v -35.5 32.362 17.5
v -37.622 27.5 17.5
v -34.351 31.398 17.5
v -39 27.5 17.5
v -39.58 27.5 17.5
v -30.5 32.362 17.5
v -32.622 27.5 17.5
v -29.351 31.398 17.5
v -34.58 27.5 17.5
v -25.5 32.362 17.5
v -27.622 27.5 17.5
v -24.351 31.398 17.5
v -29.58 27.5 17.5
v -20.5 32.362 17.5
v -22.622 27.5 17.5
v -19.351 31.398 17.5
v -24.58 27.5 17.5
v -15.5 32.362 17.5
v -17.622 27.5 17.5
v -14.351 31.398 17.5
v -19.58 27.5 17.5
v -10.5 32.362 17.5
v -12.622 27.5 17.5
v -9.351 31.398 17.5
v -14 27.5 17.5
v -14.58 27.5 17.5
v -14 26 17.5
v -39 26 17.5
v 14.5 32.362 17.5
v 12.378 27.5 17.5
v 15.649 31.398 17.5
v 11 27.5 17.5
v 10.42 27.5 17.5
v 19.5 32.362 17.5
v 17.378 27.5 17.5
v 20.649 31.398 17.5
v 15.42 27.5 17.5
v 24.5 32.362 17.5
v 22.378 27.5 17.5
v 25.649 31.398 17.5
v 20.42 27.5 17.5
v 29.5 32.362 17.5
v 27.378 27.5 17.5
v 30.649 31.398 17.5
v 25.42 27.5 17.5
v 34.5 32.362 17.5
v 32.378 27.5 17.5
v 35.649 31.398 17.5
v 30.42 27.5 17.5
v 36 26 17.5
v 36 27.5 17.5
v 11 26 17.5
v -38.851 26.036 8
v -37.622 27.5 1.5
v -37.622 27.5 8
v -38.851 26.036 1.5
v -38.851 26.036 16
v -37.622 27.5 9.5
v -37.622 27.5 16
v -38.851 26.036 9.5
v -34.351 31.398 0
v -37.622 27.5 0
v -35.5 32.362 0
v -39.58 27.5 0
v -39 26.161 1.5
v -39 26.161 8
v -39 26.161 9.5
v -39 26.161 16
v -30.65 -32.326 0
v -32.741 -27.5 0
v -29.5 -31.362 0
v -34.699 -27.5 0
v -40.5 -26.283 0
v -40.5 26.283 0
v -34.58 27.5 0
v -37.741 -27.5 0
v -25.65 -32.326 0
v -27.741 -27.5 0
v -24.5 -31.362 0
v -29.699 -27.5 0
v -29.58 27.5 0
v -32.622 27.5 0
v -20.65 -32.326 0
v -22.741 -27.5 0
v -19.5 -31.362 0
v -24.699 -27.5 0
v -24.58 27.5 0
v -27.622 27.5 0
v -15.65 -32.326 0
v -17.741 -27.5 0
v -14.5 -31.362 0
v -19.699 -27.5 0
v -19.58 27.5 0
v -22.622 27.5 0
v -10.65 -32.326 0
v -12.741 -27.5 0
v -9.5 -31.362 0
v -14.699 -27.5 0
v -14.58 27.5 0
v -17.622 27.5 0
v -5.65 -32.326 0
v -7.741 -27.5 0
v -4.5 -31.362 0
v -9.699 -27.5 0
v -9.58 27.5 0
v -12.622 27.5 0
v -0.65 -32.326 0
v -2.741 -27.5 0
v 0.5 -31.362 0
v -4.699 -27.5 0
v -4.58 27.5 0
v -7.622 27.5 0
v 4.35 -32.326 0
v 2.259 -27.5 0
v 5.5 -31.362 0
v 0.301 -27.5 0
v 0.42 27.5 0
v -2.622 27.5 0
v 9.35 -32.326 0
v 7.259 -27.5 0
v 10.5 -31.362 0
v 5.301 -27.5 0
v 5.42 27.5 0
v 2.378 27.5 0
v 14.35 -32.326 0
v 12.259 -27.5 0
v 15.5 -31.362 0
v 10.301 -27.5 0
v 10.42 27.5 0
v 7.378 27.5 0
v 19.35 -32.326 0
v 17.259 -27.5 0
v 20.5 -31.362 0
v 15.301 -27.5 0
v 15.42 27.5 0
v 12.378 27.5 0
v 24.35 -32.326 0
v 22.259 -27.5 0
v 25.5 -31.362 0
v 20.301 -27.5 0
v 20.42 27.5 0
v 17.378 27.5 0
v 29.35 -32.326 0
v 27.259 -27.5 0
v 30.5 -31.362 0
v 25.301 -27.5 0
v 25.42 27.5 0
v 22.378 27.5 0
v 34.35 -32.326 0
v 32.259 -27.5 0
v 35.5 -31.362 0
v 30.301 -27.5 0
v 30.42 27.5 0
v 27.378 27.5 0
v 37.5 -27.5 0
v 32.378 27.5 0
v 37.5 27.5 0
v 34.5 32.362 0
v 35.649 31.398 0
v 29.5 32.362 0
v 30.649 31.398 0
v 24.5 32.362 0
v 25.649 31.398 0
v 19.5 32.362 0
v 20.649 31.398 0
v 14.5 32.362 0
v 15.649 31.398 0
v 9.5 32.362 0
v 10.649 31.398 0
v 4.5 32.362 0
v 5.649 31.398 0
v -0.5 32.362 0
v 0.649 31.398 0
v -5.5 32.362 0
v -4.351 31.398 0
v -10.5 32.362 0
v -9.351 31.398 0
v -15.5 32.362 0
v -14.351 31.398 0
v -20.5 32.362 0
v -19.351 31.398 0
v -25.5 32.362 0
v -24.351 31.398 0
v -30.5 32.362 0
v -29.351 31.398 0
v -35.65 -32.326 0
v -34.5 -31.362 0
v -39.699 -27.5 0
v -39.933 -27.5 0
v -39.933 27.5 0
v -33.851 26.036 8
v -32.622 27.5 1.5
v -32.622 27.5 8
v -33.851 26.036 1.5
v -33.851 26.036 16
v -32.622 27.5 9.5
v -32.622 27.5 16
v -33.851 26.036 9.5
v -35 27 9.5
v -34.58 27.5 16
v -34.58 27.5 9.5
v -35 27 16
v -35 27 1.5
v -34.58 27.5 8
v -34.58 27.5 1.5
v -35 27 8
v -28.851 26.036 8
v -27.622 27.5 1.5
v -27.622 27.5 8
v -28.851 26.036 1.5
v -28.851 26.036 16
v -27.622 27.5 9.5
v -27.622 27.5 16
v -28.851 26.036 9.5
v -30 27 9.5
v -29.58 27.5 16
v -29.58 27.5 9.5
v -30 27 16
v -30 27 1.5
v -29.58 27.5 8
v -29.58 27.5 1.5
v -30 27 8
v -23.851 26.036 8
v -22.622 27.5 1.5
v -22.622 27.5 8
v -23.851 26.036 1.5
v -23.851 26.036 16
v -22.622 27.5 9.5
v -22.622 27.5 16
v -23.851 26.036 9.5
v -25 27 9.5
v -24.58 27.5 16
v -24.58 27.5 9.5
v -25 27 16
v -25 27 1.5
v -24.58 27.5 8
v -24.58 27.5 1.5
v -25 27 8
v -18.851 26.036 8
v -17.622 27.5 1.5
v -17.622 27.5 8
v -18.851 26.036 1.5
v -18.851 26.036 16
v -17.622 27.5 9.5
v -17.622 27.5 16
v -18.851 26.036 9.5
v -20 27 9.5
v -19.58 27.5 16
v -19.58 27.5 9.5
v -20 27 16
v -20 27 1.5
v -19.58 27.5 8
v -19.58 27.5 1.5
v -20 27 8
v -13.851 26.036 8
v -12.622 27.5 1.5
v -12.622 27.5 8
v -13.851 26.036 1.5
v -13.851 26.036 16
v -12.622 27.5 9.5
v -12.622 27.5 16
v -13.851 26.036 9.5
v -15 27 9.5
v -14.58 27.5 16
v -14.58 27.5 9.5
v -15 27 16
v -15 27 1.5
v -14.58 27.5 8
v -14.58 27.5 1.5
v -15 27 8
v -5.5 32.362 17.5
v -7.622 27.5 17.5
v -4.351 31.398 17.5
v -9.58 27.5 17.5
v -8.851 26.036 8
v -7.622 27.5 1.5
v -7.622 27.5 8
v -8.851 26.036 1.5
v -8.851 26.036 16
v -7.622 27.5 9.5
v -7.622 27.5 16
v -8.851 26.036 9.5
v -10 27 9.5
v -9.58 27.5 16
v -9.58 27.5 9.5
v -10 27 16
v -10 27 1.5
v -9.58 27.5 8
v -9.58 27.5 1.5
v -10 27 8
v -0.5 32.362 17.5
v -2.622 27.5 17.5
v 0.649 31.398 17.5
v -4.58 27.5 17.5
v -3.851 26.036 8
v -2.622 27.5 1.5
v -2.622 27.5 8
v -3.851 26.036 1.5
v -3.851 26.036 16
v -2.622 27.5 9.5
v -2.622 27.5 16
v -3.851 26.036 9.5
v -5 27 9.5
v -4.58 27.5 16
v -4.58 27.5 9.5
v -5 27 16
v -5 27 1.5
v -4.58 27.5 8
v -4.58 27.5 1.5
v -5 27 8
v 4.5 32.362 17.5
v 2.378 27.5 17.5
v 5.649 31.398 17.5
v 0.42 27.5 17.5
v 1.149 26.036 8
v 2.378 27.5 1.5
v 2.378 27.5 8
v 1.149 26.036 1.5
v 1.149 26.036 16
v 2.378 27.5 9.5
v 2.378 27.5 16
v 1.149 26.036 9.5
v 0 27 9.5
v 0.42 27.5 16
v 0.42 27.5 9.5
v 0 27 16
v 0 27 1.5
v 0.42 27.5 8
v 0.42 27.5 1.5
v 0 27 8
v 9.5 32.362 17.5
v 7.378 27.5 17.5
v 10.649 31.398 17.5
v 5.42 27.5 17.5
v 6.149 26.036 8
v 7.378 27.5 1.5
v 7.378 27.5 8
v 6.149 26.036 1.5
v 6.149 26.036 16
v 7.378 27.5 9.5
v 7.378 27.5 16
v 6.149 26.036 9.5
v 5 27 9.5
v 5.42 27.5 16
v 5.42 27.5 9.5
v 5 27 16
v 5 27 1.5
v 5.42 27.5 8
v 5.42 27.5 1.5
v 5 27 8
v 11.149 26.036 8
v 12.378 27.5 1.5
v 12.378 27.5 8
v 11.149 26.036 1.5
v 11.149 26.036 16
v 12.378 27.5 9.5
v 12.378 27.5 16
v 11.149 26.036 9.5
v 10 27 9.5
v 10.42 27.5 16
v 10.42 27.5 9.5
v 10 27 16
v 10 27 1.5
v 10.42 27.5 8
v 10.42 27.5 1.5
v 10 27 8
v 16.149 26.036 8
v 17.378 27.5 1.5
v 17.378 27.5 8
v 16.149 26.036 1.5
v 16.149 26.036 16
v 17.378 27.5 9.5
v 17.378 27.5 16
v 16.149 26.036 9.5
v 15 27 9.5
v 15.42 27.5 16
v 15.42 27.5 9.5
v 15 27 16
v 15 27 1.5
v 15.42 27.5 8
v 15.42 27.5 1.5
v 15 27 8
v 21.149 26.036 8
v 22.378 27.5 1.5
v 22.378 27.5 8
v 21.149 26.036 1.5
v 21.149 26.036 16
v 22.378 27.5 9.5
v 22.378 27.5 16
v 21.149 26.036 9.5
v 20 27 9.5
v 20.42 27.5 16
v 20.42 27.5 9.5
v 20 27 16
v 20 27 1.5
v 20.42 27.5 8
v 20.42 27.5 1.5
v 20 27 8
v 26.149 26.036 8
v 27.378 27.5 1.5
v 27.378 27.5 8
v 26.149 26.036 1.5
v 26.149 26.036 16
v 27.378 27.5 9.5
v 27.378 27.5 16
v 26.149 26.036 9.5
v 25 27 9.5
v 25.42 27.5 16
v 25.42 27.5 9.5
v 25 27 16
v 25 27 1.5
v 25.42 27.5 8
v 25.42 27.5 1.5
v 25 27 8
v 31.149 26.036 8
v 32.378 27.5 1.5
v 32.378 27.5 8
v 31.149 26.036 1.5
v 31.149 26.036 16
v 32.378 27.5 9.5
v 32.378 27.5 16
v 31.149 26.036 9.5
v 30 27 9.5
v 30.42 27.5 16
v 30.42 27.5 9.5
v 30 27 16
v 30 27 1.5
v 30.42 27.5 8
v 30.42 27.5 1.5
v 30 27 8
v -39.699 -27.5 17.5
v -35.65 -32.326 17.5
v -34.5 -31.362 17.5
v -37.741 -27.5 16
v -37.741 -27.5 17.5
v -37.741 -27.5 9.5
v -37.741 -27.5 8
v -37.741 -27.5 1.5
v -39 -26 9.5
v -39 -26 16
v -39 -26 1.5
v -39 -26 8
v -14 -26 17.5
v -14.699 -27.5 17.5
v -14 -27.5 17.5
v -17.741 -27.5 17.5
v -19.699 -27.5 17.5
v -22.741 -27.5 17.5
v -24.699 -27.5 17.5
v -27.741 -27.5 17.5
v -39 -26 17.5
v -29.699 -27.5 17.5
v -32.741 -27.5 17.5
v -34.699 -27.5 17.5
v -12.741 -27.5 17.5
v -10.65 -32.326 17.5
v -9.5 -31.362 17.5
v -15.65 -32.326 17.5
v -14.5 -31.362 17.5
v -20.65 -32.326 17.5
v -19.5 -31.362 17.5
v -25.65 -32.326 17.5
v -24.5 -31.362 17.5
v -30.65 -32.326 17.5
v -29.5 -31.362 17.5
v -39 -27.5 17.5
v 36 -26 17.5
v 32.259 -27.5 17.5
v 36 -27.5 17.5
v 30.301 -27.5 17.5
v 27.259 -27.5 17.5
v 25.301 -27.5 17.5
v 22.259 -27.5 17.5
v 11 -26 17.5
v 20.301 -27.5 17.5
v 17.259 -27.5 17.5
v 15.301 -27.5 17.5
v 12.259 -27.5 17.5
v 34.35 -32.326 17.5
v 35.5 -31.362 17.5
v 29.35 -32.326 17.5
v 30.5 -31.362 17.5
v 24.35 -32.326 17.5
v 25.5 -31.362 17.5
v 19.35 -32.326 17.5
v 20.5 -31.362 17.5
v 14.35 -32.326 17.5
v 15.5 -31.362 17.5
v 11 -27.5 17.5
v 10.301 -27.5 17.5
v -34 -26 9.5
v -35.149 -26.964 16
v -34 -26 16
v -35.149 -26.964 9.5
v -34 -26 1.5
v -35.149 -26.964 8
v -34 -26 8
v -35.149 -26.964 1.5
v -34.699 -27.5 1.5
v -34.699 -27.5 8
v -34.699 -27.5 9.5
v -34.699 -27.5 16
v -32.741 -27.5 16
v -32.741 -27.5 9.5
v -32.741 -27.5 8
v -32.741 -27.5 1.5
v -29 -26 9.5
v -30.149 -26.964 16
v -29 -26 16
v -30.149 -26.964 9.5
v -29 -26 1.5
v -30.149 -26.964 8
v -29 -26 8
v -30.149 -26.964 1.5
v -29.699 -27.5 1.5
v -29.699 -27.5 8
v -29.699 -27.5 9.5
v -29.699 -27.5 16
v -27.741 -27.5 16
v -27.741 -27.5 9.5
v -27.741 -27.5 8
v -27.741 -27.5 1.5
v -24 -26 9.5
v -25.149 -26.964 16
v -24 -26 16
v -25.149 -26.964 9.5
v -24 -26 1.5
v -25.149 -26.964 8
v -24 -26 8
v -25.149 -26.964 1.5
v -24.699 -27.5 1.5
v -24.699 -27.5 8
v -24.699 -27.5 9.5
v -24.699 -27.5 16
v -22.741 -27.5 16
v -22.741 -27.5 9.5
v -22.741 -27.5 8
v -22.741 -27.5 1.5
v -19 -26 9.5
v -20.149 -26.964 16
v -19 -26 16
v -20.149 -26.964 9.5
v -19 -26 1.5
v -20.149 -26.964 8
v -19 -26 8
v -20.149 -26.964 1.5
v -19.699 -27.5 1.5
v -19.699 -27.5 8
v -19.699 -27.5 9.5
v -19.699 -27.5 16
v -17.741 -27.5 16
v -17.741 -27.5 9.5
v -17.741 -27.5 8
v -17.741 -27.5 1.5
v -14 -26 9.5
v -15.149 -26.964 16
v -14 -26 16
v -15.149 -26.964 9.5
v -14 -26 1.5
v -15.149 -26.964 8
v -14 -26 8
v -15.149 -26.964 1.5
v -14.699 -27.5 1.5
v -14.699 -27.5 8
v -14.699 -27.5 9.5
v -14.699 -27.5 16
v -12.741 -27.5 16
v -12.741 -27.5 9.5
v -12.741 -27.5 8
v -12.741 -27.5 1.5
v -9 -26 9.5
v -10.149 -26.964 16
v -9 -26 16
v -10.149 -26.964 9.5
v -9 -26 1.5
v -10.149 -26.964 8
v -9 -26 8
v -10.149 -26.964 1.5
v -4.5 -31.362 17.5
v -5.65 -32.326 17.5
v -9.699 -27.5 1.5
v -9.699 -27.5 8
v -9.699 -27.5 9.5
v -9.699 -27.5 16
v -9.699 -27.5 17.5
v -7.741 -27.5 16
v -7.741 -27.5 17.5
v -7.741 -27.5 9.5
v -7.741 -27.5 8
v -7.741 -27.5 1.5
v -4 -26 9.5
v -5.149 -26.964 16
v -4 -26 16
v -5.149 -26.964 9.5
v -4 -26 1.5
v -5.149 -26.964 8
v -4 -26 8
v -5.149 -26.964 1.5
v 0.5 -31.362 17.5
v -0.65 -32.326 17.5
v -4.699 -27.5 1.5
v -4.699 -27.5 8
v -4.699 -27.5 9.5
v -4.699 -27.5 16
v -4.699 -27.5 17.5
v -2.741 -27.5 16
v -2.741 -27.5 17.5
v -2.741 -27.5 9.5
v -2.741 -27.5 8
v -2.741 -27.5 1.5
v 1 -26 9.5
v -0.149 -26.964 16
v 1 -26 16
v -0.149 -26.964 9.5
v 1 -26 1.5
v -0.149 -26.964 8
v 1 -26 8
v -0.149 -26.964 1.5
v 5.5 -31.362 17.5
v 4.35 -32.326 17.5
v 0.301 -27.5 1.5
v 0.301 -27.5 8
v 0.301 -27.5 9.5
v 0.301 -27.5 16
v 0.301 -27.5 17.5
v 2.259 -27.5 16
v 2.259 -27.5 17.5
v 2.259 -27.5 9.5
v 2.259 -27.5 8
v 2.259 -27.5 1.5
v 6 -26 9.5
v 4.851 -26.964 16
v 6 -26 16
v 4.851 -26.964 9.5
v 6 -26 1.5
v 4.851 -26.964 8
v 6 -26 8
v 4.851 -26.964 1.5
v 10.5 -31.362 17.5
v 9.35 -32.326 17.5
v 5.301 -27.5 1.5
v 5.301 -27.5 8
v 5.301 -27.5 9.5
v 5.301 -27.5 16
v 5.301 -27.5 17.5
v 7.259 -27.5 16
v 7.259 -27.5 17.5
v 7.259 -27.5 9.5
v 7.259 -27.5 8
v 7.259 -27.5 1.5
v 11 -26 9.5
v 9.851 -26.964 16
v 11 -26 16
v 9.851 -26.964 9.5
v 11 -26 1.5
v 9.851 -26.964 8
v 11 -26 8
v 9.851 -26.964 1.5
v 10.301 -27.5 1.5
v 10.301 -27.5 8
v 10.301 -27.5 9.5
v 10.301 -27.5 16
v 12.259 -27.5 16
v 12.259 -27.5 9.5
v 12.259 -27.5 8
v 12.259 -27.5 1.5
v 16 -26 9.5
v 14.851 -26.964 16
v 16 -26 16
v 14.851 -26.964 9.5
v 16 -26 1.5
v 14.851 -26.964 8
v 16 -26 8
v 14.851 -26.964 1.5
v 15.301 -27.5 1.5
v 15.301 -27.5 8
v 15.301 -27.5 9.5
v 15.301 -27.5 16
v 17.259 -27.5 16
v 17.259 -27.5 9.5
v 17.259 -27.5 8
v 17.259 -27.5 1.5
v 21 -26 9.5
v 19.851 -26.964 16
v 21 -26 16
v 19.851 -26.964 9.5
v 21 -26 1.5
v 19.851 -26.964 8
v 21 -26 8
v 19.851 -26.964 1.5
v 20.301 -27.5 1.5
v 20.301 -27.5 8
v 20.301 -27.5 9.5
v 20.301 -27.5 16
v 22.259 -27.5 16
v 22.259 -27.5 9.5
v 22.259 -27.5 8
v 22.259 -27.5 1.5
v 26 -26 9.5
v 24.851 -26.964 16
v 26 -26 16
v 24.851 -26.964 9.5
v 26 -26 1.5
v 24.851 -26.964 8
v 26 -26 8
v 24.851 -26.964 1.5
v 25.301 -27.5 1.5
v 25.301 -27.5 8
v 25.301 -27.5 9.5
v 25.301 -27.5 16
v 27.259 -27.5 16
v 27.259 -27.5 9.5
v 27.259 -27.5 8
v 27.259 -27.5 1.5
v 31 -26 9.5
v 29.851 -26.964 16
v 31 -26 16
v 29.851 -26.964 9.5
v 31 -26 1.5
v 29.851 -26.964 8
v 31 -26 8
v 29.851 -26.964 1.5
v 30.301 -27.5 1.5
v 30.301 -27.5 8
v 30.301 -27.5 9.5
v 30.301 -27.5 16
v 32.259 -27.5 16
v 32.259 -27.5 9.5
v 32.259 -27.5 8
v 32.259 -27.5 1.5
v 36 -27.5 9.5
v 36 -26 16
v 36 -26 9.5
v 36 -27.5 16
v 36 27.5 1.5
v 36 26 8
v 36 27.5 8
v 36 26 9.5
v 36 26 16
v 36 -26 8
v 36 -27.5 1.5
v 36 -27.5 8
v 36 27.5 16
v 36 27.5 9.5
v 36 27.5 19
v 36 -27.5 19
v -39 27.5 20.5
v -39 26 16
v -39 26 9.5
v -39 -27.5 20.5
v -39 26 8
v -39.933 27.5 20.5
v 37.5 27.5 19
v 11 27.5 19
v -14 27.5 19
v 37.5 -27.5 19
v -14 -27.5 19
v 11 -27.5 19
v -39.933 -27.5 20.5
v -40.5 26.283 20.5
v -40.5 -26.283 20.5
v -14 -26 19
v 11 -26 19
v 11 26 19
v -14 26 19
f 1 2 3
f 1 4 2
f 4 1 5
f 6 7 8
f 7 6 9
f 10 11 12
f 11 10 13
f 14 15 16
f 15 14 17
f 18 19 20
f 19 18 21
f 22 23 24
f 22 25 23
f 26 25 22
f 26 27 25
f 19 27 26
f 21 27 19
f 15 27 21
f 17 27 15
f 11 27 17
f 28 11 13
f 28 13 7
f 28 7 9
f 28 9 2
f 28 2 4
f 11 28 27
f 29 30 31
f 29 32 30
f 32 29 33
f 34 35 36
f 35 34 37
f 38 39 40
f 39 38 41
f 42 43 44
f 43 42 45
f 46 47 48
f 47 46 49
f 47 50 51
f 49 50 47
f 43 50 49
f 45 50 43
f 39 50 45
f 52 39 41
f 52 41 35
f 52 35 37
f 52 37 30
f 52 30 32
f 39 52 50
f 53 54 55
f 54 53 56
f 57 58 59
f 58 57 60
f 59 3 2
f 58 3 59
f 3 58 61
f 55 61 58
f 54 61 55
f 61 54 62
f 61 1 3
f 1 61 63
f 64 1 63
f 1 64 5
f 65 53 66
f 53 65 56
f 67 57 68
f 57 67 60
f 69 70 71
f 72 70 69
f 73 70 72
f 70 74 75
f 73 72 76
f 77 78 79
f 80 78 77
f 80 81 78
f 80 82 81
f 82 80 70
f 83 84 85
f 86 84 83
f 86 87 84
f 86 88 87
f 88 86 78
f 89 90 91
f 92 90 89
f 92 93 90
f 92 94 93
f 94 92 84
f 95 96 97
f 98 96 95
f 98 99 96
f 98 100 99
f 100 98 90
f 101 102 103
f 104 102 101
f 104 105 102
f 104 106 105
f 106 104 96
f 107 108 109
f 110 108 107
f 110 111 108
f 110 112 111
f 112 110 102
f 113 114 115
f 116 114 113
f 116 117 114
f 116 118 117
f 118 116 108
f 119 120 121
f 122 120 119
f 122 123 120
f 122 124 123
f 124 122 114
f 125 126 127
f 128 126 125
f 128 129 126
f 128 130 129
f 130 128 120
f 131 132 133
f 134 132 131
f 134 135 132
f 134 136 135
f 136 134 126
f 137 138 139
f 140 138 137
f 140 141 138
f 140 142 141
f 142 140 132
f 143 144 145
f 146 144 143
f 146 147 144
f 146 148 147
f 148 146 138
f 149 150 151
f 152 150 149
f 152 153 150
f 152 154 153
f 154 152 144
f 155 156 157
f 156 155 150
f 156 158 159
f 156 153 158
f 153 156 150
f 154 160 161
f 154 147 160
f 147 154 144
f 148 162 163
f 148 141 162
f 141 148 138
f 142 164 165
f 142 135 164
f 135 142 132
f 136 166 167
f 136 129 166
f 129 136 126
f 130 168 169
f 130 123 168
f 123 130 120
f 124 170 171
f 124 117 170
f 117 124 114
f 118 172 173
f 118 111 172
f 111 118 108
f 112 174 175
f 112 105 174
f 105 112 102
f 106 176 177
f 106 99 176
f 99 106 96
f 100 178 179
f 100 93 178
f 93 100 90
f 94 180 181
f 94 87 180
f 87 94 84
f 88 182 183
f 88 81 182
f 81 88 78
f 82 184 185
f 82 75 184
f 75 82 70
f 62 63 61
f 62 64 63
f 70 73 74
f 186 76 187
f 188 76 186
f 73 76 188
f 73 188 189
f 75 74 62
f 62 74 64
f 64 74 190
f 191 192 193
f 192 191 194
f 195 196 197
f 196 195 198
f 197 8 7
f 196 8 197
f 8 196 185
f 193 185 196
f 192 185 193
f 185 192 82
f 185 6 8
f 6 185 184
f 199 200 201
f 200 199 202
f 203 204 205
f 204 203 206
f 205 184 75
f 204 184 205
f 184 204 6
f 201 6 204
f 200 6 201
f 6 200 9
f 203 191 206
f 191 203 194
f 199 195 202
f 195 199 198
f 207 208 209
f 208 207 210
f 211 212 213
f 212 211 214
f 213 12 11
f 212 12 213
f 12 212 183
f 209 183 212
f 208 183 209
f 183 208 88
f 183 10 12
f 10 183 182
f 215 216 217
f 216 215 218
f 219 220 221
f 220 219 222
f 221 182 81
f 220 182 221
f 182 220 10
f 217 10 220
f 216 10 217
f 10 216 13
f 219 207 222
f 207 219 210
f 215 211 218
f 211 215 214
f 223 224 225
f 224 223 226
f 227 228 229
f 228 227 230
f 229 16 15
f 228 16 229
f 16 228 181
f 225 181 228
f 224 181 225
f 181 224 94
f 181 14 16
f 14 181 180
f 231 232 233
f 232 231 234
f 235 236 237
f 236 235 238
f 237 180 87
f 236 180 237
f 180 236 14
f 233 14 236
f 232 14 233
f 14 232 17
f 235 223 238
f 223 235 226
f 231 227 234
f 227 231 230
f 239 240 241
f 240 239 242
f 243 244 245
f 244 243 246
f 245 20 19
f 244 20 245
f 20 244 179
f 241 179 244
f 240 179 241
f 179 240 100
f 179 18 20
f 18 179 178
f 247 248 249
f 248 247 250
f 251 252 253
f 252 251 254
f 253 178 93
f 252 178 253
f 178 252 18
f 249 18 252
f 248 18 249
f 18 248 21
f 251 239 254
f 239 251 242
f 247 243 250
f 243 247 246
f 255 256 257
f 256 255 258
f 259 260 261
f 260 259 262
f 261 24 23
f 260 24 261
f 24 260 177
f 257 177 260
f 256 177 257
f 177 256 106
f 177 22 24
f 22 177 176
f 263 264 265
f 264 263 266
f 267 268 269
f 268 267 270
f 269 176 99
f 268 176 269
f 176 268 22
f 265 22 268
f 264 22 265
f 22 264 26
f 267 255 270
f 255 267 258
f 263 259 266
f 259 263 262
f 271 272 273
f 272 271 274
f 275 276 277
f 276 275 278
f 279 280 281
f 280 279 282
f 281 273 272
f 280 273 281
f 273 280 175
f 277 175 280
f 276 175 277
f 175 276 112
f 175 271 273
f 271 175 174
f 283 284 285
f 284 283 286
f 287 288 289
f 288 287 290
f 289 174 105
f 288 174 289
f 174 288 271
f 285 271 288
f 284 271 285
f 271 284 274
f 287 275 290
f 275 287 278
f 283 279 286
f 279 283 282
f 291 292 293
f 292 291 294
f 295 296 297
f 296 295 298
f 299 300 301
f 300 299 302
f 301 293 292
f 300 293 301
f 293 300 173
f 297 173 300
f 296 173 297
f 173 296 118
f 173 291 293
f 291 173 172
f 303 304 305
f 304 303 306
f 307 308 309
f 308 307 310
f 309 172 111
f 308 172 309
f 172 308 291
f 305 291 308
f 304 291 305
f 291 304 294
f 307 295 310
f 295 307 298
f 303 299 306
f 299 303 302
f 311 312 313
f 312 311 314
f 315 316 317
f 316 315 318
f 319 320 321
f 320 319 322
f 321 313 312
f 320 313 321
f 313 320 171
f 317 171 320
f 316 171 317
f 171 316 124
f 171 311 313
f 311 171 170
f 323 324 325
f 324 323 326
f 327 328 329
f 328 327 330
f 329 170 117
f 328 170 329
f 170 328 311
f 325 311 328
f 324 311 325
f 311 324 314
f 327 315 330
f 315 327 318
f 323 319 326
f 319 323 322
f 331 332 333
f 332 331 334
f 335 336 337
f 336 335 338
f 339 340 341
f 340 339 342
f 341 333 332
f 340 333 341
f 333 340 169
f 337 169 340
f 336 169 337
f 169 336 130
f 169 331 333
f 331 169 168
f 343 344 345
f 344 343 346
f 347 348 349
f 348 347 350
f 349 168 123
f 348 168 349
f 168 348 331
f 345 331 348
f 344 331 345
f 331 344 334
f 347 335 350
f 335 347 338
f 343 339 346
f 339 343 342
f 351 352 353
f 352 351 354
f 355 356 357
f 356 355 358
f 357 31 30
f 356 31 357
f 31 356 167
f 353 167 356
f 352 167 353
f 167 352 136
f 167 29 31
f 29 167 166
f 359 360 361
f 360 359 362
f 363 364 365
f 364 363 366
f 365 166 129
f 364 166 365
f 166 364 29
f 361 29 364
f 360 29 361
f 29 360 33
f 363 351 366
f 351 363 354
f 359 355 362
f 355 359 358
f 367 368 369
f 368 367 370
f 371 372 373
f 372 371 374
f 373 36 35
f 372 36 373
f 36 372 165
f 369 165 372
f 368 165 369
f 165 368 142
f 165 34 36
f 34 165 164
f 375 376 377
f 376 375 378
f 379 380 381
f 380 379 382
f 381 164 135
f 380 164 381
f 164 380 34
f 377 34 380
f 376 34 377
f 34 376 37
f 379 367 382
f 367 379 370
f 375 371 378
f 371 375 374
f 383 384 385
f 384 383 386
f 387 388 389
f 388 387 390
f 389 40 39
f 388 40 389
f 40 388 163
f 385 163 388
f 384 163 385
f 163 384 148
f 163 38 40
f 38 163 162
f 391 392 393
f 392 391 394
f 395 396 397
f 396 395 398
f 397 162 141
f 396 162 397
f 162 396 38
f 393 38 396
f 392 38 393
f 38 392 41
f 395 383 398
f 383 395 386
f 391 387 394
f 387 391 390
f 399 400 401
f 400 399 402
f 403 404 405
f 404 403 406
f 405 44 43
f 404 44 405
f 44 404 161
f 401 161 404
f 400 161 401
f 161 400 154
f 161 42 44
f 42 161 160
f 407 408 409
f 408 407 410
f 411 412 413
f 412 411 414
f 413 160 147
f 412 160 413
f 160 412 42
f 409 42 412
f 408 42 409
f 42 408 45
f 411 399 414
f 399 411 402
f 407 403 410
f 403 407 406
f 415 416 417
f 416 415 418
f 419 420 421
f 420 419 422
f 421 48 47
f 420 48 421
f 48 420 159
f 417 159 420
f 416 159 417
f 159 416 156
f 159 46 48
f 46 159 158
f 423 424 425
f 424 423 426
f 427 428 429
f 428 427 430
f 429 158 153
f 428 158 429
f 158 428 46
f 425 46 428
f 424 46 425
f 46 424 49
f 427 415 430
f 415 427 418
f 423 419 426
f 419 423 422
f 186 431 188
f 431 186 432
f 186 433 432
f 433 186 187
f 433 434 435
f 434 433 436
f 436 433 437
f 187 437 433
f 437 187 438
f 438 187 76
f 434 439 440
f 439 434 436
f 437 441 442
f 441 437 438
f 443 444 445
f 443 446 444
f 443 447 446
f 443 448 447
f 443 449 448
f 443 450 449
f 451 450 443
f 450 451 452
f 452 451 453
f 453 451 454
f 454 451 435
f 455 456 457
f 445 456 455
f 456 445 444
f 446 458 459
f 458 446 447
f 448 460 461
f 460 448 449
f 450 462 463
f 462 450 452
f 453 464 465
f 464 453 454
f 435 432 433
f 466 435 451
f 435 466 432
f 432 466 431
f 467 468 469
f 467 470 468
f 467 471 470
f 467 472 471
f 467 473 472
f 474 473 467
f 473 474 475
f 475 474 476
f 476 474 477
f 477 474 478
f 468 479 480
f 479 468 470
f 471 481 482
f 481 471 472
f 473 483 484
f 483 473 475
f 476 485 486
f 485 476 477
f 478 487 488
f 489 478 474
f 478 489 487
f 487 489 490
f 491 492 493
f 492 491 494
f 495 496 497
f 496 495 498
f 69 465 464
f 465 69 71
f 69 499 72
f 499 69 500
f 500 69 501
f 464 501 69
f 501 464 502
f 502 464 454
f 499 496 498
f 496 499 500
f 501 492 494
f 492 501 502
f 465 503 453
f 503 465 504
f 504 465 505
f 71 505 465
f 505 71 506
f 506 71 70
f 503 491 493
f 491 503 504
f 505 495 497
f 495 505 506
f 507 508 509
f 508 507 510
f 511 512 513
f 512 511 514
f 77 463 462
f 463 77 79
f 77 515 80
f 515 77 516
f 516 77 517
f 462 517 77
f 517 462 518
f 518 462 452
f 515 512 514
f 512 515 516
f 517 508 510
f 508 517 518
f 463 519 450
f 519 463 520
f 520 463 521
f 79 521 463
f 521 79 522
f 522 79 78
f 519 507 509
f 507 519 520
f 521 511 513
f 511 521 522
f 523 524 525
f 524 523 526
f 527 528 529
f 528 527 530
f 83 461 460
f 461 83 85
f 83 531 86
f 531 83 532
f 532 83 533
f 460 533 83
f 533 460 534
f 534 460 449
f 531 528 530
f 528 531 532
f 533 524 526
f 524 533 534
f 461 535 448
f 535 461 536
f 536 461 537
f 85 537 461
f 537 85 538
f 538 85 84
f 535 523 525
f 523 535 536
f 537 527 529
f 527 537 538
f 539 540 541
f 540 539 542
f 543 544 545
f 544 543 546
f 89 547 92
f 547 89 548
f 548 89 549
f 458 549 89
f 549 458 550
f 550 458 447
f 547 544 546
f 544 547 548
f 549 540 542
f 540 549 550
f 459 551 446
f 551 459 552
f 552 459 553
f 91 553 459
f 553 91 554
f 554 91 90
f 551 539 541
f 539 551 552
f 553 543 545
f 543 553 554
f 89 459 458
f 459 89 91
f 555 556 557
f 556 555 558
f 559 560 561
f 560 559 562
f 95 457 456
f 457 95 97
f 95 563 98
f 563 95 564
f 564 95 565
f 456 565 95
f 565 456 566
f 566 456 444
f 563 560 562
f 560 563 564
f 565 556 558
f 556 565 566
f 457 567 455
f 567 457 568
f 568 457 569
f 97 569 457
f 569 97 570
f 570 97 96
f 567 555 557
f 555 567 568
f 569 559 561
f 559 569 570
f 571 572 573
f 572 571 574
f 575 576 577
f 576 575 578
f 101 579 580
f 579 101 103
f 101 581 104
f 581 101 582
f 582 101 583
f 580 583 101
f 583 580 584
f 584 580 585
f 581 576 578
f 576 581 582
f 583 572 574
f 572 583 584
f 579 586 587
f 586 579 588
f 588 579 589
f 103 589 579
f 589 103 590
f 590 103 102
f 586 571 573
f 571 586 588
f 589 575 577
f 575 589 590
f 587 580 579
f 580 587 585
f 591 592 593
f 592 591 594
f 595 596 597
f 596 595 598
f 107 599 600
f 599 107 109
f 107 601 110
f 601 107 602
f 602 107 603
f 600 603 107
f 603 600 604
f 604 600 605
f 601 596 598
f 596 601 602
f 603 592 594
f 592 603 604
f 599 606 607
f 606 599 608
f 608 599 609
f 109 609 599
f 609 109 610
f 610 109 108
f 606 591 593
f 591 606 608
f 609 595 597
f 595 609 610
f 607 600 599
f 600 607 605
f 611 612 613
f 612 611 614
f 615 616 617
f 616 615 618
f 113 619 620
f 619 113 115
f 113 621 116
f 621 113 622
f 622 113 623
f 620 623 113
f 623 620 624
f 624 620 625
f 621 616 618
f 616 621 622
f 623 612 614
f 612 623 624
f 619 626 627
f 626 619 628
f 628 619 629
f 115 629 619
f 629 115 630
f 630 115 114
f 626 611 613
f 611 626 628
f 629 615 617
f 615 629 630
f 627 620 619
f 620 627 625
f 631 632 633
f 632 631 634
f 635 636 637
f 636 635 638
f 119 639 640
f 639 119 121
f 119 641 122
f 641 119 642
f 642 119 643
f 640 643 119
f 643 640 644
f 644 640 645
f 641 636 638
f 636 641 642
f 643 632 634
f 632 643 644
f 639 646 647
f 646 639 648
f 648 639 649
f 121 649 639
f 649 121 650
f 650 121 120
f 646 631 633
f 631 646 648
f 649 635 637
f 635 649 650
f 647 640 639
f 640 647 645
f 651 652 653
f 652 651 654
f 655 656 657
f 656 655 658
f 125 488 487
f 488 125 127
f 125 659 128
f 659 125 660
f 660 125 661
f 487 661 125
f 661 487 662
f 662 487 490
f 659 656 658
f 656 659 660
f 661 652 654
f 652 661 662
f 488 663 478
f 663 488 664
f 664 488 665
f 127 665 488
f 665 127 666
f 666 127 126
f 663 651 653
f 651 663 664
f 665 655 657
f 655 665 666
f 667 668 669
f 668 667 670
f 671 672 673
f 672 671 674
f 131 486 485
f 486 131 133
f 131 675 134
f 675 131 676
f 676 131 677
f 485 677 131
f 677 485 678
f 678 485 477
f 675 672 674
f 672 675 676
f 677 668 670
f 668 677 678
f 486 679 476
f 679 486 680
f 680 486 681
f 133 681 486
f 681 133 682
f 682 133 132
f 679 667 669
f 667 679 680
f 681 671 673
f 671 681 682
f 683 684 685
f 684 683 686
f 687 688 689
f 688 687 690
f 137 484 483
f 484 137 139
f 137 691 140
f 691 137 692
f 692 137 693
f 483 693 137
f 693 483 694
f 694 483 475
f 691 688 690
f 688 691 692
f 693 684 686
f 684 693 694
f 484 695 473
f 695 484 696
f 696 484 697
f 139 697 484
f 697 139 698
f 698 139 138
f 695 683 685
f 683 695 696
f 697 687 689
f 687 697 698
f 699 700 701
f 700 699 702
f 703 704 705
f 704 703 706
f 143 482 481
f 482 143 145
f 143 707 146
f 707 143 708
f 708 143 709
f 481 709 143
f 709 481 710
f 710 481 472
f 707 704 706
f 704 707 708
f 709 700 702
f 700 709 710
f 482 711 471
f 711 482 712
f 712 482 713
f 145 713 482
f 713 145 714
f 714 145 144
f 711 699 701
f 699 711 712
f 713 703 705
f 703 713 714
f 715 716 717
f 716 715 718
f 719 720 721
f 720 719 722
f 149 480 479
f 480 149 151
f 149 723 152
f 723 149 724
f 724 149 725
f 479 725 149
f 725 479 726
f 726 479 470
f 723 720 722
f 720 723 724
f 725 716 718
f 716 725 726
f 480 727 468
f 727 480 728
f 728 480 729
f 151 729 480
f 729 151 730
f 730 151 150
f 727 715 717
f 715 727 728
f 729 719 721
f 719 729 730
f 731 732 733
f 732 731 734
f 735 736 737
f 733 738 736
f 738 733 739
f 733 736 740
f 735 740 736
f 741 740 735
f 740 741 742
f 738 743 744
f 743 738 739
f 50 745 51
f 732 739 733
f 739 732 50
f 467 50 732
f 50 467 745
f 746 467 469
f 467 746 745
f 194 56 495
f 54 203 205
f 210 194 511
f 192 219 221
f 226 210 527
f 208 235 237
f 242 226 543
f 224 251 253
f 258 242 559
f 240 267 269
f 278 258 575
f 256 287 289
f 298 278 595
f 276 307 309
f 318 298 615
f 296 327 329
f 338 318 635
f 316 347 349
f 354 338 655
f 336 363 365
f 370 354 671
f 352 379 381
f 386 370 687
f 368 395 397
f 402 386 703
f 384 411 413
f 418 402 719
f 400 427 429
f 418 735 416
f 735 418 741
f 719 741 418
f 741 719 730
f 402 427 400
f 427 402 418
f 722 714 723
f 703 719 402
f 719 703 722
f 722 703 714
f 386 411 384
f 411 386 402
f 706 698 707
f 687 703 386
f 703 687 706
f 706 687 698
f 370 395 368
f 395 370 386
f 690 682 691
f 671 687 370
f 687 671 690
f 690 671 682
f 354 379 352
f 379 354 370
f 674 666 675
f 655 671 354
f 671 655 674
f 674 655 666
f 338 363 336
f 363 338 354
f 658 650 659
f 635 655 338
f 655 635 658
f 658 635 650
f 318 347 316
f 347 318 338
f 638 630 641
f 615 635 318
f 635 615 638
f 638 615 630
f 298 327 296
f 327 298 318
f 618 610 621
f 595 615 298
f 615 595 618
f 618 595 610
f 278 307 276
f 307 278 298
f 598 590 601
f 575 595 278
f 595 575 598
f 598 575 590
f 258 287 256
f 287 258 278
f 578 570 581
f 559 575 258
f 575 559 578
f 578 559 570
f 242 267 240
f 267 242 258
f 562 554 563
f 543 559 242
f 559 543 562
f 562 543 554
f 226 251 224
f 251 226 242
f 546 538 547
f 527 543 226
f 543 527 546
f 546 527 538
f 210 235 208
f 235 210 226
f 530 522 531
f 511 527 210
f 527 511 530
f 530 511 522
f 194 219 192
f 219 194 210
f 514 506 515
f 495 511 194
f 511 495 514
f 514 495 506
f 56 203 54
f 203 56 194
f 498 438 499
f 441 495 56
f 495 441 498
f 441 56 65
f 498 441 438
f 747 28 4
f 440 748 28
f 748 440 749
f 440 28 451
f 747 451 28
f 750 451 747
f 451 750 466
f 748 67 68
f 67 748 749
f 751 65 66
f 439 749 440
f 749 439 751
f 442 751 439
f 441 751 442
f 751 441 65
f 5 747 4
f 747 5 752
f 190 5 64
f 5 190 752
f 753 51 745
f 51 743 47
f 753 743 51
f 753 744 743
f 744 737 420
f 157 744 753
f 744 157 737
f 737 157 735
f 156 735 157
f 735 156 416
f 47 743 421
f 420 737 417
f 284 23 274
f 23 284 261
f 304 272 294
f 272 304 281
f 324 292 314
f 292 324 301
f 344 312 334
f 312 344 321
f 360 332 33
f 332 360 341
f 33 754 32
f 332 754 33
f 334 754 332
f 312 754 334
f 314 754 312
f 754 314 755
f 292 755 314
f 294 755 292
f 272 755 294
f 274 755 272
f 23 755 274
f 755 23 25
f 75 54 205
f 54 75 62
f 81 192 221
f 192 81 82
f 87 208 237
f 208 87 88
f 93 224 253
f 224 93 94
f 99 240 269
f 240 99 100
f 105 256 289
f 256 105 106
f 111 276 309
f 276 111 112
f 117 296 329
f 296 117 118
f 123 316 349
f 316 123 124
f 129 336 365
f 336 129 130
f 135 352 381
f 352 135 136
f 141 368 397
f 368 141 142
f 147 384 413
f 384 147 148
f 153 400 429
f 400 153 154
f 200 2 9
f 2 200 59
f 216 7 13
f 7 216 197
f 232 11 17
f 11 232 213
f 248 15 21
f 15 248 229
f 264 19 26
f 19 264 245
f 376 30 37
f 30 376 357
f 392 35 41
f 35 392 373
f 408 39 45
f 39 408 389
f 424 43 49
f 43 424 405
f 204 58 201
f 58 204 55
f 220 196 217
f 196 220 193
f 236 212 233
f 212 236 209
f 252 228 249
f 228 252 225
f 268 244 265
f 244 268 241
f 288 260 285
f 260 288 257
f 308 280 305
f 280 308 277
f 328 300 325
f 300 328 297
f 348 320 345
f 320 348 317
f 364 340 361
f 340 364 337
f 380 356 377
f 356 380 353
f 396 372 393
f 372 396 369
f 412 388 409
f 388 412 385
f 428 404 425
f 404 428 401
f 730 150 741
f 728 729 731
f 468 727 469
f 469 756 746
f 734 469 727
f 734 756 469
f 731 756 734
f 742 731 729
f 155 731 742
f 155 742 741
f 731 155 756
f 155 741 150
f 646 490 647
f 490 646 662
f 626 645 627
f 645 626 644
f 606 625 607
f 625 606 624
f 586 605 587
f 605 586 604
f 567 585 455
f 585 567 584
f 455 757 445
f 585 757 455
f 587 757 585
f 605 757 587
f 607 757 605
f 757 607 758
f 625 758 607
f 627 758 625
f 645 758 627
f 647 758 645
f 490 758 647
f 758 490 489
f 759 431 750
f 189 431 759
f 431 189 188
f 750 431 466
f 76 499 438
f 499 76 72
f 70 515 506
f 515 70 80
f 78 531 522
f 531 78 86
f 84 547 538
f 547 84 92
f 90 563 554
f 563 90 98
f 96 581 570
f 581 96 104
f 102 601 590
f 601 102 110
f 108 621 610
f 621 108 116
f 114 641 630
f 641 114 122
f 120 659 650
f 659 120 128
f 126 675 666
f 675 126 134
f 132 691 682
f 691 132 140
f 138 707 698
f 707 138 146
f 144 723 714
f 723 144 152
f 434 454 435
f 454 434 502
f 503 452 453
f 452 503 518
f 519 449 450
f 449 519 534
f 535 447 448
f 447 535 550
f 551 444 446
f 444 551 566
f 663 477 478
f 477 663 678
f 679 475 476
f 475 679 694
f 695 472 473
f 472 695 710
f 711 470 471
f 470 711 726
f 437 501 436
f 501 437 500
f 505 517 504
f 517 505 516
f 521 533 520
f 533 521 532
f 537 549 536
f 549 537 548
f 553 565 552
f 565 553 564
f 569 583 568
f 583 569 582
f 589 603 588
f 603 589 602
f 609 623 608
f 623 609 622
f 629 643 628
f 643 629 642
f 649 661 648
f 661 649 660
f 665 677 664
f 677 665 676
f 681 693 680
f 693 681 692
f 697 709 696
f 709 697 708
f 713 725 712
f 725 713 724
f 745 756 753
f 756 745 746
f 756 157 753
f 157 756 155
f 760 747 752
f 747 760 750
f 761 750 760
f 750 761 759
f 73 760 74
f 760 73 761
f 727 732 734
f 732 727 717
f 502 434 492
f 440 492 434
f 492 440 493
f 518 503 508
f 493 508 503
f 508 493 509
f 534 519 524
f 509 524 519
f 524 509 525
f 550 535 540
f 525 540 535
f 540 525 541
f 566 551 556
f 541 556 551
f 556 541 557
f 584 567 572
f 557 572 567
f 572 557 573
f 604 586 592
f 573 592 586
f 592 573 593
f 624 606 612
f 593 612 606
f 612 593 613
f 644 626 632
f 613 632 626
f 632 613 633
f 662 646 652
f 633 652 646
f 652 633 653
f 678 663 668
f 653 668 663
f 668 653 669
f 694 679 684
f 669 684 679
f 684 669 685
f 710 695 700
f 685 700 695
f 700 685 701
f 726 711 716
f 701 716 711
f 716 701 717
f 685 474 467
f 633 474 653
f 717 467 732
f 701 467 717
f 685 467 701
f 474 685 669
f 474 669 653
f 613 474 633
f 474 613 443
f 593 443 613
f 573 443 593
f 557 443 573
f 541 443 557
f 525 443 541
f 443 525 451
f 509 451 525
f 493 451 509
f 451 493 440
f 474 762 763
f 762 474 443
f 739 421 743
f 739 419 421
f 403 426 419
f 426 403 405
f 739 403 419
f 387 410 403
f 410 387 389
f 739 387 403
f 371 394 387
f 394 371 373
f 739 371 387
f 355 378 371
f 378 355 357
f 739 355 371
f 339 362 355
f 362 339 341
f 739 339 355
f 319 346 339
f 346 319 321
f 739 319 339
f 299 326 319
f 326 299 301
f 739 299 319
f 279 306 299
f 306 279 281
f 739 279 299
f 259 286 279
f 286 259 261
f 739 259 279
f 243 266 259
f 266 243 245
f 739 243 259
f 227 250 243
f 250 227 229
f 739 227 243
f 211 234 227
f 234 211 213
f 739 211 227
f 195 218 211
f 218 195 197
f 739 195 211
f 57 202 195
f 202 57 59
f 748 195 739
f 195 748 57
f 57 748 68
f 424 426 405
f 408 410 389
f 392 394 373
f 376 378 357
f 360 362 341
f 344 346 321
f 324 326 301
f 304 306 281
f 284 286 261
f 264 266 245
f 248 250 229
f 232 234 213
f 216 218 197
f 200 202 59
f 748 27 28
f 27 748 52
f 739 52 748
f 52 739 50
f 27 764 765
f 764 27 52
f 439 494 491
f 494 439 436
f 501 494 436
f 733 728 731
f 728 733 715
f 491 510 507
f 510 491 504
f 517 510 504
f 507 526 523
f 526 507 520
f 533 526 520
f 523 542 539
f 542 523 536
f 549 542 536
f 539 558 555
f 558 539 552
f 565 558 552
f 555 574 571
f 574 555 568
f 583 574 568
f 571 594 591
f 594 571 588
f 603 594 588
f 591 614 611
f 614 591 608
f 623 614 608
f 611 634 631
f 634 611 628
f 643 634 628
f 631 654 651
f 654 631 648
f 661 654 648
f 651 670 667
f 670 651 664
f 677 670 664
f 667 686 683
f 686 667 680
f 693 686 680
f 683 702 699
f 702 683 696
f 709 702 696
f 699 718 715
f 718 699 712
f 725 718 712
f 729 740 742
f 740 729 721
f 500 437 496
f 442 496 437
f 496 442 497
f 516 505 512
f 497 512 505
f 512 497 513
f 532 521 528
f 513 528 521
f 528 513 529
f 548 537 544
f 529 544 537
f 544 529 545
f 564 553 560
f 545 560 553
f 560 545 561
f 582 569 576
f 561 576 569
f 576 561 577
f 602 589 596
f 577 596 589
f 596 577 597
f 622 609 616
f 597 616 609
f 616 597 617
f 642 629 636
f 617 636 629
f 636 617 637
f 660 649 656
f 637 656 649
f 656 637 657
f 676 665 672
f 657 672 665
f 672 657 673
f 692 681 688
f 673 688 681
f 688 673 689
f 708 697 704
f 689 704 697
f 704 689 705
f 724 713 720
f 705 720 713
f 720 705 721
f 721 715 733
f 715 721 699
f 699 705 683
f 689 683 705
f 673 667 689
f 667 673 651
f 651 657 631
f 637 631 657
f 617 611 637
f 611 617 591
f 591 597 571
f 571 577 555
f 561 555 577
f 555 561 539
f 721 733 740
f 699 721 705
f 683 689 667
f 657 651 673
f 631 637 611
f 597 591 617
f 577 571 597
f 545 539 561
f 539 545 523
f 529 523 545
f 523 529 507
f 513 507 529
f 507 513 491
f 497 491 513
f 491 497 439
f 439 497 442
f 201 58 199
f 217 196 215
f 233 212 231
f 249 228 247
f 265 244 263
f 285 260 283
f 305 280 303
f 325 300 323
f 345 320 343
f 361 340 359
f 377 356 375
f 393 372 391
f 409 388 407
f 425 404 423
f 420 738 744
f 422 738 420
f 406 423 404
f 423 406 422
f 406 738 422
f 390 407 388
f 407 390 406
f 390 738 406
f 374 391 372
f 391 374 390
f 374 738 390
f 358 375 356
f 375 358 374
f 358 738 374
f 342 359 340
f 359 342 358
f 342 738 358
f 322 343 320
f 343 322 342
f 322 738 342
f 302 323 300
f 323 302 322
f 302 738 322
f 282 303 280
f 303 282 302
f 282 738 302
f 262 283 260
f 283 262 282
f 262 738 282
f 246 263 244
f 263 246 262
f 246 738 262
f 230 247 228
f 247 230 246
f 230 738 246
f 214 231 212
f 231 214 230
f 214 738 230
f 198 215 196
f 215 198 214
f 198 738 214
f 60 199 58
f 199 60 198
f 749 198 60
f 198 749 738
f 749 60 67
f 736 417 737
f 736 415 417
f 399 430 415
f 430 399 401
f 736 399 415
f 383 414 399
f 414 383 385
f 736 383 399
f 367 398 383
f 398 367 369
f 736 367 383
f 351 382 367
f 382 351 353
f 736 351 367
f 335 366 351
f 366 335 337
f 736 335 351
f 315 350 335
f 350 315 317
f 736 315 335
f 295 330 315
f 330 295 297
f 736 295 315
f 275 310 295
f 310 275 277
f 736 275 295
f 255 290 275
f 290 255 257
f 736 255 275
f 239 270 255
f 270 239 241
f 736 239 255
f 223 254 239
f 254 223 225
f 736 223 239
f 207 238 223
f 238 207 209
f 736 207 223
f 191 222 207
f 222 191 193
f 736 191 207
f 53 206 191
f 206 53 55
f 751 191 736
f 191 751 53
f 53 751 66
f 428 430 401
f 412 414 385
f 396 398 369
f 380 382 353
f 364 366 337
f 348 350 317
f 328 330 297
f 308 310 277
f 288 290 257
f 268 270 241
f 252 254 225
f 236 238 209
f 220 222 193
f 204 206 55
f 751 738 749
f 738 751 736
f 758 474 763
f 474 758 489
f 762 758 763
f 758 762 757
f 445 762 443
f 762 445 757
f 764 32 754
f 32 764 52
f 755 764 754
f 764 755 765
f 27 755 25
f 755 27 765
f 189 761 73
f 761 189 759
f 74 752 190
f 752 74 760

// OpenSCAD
// Which part would you like to see?
part = "box"; // [box:box only,front:front only]

// Heigth of box in mm (Inside).
height = 75; 

// Width of box in mm (Inside).
width = 52;

// Depth of box in mm (Inside).
depth = 16;

// Wall thicknes of box in mm.
thickness = 1.5; 

// Diameter of screw hole in mm.
diameter_hole = 0;

// Length of the slats in mm.
length_slats = 7;

// Pointed or flat roof?
roof = "flat"; // [pointed:pointed roof, flat:flat roof]

roof_angle = 115;

module housing(){
    cube([height,width+2*thickness,thickness]);
    rotate([0,-90,0])
        translate([0,0,-height-thickness])
            cube([depth+2*thickness,width+2*thickness,thickness]);
    if (roof == "flat") {
        rotate([0,0,90])
            cube([width+2*thickness,thickness,depth+3*thickness]);
    } else {
        rotate([0,0,90])
            cube([width+2*thickness,width,depth+3*thickness]);
    }
    for (a=[-1:5:height-5])
        translate([a,width+thickness+1,0])
            rotate([90,0,50])
                cube([length_slats,depth+thickness,1.5]);
    for (b=[0:5:height-5])
        translate([b,thickness,0])
            rotate([90,0,-50])
                cube([length_slats,depth+thickness,1.5]);
    translate([0,0,depth])
        cube([height,thickness,thickness]);
    translate([0,width+thickness,depth])
        cube([height,thickness,thickness]);
    translate([0,0,depth/2])
        cube([height,thickness,thickness]);
    translate([0,width+thickness,depth/2])
        cube([height,thickness,thickness]);
    translate([height/3,0,depth+thickness])
        cube([height/3,thickness,thickness]);
    translate([height/3,width+thickness,depth+thickness])
        cube([height/3,thickness,thickness]);
}

module cutouthousing(){
    translate([height/5,width/2+thickness,-1])
        cylinder(h=thickness+2, r=diameter_hole/2);

    translate([0,-2,depth+5*thickness])
        rotate([270,0,roof_angle])
            cube([width+thickness,depth+6*thickness,100]);
    translate([0,width+2*thickness+2,-thickness])
        rotate([90,0,-roof_angle])
            cube([width+4*thickness,depth+6*thickness,100]);   
}

module front(){
    cube([height,width+2*thickness,thickness]);    
}

module cutoutfront(){
    translate([height/3,0,0])
        cube([height/3,thickness,thickness]);
    translate([height/3,width+thickness,0])
        cube([height/3,thickness,thickness]);
}
    

$fn=50;

module box(){
    difference(){
        housing();
        cutouthousing();
    }
}

module door(){
    difference(){
        front();
        cutoutfront();
    }
}

print_part();

module print_part() {
	if (part == "box") {
		translate([-height/2-thickness,-width/2-thickness,0]) box();
	} else if (part == "front") {
		translate([-height/2,-width/2,0]) door();
	} 
}
